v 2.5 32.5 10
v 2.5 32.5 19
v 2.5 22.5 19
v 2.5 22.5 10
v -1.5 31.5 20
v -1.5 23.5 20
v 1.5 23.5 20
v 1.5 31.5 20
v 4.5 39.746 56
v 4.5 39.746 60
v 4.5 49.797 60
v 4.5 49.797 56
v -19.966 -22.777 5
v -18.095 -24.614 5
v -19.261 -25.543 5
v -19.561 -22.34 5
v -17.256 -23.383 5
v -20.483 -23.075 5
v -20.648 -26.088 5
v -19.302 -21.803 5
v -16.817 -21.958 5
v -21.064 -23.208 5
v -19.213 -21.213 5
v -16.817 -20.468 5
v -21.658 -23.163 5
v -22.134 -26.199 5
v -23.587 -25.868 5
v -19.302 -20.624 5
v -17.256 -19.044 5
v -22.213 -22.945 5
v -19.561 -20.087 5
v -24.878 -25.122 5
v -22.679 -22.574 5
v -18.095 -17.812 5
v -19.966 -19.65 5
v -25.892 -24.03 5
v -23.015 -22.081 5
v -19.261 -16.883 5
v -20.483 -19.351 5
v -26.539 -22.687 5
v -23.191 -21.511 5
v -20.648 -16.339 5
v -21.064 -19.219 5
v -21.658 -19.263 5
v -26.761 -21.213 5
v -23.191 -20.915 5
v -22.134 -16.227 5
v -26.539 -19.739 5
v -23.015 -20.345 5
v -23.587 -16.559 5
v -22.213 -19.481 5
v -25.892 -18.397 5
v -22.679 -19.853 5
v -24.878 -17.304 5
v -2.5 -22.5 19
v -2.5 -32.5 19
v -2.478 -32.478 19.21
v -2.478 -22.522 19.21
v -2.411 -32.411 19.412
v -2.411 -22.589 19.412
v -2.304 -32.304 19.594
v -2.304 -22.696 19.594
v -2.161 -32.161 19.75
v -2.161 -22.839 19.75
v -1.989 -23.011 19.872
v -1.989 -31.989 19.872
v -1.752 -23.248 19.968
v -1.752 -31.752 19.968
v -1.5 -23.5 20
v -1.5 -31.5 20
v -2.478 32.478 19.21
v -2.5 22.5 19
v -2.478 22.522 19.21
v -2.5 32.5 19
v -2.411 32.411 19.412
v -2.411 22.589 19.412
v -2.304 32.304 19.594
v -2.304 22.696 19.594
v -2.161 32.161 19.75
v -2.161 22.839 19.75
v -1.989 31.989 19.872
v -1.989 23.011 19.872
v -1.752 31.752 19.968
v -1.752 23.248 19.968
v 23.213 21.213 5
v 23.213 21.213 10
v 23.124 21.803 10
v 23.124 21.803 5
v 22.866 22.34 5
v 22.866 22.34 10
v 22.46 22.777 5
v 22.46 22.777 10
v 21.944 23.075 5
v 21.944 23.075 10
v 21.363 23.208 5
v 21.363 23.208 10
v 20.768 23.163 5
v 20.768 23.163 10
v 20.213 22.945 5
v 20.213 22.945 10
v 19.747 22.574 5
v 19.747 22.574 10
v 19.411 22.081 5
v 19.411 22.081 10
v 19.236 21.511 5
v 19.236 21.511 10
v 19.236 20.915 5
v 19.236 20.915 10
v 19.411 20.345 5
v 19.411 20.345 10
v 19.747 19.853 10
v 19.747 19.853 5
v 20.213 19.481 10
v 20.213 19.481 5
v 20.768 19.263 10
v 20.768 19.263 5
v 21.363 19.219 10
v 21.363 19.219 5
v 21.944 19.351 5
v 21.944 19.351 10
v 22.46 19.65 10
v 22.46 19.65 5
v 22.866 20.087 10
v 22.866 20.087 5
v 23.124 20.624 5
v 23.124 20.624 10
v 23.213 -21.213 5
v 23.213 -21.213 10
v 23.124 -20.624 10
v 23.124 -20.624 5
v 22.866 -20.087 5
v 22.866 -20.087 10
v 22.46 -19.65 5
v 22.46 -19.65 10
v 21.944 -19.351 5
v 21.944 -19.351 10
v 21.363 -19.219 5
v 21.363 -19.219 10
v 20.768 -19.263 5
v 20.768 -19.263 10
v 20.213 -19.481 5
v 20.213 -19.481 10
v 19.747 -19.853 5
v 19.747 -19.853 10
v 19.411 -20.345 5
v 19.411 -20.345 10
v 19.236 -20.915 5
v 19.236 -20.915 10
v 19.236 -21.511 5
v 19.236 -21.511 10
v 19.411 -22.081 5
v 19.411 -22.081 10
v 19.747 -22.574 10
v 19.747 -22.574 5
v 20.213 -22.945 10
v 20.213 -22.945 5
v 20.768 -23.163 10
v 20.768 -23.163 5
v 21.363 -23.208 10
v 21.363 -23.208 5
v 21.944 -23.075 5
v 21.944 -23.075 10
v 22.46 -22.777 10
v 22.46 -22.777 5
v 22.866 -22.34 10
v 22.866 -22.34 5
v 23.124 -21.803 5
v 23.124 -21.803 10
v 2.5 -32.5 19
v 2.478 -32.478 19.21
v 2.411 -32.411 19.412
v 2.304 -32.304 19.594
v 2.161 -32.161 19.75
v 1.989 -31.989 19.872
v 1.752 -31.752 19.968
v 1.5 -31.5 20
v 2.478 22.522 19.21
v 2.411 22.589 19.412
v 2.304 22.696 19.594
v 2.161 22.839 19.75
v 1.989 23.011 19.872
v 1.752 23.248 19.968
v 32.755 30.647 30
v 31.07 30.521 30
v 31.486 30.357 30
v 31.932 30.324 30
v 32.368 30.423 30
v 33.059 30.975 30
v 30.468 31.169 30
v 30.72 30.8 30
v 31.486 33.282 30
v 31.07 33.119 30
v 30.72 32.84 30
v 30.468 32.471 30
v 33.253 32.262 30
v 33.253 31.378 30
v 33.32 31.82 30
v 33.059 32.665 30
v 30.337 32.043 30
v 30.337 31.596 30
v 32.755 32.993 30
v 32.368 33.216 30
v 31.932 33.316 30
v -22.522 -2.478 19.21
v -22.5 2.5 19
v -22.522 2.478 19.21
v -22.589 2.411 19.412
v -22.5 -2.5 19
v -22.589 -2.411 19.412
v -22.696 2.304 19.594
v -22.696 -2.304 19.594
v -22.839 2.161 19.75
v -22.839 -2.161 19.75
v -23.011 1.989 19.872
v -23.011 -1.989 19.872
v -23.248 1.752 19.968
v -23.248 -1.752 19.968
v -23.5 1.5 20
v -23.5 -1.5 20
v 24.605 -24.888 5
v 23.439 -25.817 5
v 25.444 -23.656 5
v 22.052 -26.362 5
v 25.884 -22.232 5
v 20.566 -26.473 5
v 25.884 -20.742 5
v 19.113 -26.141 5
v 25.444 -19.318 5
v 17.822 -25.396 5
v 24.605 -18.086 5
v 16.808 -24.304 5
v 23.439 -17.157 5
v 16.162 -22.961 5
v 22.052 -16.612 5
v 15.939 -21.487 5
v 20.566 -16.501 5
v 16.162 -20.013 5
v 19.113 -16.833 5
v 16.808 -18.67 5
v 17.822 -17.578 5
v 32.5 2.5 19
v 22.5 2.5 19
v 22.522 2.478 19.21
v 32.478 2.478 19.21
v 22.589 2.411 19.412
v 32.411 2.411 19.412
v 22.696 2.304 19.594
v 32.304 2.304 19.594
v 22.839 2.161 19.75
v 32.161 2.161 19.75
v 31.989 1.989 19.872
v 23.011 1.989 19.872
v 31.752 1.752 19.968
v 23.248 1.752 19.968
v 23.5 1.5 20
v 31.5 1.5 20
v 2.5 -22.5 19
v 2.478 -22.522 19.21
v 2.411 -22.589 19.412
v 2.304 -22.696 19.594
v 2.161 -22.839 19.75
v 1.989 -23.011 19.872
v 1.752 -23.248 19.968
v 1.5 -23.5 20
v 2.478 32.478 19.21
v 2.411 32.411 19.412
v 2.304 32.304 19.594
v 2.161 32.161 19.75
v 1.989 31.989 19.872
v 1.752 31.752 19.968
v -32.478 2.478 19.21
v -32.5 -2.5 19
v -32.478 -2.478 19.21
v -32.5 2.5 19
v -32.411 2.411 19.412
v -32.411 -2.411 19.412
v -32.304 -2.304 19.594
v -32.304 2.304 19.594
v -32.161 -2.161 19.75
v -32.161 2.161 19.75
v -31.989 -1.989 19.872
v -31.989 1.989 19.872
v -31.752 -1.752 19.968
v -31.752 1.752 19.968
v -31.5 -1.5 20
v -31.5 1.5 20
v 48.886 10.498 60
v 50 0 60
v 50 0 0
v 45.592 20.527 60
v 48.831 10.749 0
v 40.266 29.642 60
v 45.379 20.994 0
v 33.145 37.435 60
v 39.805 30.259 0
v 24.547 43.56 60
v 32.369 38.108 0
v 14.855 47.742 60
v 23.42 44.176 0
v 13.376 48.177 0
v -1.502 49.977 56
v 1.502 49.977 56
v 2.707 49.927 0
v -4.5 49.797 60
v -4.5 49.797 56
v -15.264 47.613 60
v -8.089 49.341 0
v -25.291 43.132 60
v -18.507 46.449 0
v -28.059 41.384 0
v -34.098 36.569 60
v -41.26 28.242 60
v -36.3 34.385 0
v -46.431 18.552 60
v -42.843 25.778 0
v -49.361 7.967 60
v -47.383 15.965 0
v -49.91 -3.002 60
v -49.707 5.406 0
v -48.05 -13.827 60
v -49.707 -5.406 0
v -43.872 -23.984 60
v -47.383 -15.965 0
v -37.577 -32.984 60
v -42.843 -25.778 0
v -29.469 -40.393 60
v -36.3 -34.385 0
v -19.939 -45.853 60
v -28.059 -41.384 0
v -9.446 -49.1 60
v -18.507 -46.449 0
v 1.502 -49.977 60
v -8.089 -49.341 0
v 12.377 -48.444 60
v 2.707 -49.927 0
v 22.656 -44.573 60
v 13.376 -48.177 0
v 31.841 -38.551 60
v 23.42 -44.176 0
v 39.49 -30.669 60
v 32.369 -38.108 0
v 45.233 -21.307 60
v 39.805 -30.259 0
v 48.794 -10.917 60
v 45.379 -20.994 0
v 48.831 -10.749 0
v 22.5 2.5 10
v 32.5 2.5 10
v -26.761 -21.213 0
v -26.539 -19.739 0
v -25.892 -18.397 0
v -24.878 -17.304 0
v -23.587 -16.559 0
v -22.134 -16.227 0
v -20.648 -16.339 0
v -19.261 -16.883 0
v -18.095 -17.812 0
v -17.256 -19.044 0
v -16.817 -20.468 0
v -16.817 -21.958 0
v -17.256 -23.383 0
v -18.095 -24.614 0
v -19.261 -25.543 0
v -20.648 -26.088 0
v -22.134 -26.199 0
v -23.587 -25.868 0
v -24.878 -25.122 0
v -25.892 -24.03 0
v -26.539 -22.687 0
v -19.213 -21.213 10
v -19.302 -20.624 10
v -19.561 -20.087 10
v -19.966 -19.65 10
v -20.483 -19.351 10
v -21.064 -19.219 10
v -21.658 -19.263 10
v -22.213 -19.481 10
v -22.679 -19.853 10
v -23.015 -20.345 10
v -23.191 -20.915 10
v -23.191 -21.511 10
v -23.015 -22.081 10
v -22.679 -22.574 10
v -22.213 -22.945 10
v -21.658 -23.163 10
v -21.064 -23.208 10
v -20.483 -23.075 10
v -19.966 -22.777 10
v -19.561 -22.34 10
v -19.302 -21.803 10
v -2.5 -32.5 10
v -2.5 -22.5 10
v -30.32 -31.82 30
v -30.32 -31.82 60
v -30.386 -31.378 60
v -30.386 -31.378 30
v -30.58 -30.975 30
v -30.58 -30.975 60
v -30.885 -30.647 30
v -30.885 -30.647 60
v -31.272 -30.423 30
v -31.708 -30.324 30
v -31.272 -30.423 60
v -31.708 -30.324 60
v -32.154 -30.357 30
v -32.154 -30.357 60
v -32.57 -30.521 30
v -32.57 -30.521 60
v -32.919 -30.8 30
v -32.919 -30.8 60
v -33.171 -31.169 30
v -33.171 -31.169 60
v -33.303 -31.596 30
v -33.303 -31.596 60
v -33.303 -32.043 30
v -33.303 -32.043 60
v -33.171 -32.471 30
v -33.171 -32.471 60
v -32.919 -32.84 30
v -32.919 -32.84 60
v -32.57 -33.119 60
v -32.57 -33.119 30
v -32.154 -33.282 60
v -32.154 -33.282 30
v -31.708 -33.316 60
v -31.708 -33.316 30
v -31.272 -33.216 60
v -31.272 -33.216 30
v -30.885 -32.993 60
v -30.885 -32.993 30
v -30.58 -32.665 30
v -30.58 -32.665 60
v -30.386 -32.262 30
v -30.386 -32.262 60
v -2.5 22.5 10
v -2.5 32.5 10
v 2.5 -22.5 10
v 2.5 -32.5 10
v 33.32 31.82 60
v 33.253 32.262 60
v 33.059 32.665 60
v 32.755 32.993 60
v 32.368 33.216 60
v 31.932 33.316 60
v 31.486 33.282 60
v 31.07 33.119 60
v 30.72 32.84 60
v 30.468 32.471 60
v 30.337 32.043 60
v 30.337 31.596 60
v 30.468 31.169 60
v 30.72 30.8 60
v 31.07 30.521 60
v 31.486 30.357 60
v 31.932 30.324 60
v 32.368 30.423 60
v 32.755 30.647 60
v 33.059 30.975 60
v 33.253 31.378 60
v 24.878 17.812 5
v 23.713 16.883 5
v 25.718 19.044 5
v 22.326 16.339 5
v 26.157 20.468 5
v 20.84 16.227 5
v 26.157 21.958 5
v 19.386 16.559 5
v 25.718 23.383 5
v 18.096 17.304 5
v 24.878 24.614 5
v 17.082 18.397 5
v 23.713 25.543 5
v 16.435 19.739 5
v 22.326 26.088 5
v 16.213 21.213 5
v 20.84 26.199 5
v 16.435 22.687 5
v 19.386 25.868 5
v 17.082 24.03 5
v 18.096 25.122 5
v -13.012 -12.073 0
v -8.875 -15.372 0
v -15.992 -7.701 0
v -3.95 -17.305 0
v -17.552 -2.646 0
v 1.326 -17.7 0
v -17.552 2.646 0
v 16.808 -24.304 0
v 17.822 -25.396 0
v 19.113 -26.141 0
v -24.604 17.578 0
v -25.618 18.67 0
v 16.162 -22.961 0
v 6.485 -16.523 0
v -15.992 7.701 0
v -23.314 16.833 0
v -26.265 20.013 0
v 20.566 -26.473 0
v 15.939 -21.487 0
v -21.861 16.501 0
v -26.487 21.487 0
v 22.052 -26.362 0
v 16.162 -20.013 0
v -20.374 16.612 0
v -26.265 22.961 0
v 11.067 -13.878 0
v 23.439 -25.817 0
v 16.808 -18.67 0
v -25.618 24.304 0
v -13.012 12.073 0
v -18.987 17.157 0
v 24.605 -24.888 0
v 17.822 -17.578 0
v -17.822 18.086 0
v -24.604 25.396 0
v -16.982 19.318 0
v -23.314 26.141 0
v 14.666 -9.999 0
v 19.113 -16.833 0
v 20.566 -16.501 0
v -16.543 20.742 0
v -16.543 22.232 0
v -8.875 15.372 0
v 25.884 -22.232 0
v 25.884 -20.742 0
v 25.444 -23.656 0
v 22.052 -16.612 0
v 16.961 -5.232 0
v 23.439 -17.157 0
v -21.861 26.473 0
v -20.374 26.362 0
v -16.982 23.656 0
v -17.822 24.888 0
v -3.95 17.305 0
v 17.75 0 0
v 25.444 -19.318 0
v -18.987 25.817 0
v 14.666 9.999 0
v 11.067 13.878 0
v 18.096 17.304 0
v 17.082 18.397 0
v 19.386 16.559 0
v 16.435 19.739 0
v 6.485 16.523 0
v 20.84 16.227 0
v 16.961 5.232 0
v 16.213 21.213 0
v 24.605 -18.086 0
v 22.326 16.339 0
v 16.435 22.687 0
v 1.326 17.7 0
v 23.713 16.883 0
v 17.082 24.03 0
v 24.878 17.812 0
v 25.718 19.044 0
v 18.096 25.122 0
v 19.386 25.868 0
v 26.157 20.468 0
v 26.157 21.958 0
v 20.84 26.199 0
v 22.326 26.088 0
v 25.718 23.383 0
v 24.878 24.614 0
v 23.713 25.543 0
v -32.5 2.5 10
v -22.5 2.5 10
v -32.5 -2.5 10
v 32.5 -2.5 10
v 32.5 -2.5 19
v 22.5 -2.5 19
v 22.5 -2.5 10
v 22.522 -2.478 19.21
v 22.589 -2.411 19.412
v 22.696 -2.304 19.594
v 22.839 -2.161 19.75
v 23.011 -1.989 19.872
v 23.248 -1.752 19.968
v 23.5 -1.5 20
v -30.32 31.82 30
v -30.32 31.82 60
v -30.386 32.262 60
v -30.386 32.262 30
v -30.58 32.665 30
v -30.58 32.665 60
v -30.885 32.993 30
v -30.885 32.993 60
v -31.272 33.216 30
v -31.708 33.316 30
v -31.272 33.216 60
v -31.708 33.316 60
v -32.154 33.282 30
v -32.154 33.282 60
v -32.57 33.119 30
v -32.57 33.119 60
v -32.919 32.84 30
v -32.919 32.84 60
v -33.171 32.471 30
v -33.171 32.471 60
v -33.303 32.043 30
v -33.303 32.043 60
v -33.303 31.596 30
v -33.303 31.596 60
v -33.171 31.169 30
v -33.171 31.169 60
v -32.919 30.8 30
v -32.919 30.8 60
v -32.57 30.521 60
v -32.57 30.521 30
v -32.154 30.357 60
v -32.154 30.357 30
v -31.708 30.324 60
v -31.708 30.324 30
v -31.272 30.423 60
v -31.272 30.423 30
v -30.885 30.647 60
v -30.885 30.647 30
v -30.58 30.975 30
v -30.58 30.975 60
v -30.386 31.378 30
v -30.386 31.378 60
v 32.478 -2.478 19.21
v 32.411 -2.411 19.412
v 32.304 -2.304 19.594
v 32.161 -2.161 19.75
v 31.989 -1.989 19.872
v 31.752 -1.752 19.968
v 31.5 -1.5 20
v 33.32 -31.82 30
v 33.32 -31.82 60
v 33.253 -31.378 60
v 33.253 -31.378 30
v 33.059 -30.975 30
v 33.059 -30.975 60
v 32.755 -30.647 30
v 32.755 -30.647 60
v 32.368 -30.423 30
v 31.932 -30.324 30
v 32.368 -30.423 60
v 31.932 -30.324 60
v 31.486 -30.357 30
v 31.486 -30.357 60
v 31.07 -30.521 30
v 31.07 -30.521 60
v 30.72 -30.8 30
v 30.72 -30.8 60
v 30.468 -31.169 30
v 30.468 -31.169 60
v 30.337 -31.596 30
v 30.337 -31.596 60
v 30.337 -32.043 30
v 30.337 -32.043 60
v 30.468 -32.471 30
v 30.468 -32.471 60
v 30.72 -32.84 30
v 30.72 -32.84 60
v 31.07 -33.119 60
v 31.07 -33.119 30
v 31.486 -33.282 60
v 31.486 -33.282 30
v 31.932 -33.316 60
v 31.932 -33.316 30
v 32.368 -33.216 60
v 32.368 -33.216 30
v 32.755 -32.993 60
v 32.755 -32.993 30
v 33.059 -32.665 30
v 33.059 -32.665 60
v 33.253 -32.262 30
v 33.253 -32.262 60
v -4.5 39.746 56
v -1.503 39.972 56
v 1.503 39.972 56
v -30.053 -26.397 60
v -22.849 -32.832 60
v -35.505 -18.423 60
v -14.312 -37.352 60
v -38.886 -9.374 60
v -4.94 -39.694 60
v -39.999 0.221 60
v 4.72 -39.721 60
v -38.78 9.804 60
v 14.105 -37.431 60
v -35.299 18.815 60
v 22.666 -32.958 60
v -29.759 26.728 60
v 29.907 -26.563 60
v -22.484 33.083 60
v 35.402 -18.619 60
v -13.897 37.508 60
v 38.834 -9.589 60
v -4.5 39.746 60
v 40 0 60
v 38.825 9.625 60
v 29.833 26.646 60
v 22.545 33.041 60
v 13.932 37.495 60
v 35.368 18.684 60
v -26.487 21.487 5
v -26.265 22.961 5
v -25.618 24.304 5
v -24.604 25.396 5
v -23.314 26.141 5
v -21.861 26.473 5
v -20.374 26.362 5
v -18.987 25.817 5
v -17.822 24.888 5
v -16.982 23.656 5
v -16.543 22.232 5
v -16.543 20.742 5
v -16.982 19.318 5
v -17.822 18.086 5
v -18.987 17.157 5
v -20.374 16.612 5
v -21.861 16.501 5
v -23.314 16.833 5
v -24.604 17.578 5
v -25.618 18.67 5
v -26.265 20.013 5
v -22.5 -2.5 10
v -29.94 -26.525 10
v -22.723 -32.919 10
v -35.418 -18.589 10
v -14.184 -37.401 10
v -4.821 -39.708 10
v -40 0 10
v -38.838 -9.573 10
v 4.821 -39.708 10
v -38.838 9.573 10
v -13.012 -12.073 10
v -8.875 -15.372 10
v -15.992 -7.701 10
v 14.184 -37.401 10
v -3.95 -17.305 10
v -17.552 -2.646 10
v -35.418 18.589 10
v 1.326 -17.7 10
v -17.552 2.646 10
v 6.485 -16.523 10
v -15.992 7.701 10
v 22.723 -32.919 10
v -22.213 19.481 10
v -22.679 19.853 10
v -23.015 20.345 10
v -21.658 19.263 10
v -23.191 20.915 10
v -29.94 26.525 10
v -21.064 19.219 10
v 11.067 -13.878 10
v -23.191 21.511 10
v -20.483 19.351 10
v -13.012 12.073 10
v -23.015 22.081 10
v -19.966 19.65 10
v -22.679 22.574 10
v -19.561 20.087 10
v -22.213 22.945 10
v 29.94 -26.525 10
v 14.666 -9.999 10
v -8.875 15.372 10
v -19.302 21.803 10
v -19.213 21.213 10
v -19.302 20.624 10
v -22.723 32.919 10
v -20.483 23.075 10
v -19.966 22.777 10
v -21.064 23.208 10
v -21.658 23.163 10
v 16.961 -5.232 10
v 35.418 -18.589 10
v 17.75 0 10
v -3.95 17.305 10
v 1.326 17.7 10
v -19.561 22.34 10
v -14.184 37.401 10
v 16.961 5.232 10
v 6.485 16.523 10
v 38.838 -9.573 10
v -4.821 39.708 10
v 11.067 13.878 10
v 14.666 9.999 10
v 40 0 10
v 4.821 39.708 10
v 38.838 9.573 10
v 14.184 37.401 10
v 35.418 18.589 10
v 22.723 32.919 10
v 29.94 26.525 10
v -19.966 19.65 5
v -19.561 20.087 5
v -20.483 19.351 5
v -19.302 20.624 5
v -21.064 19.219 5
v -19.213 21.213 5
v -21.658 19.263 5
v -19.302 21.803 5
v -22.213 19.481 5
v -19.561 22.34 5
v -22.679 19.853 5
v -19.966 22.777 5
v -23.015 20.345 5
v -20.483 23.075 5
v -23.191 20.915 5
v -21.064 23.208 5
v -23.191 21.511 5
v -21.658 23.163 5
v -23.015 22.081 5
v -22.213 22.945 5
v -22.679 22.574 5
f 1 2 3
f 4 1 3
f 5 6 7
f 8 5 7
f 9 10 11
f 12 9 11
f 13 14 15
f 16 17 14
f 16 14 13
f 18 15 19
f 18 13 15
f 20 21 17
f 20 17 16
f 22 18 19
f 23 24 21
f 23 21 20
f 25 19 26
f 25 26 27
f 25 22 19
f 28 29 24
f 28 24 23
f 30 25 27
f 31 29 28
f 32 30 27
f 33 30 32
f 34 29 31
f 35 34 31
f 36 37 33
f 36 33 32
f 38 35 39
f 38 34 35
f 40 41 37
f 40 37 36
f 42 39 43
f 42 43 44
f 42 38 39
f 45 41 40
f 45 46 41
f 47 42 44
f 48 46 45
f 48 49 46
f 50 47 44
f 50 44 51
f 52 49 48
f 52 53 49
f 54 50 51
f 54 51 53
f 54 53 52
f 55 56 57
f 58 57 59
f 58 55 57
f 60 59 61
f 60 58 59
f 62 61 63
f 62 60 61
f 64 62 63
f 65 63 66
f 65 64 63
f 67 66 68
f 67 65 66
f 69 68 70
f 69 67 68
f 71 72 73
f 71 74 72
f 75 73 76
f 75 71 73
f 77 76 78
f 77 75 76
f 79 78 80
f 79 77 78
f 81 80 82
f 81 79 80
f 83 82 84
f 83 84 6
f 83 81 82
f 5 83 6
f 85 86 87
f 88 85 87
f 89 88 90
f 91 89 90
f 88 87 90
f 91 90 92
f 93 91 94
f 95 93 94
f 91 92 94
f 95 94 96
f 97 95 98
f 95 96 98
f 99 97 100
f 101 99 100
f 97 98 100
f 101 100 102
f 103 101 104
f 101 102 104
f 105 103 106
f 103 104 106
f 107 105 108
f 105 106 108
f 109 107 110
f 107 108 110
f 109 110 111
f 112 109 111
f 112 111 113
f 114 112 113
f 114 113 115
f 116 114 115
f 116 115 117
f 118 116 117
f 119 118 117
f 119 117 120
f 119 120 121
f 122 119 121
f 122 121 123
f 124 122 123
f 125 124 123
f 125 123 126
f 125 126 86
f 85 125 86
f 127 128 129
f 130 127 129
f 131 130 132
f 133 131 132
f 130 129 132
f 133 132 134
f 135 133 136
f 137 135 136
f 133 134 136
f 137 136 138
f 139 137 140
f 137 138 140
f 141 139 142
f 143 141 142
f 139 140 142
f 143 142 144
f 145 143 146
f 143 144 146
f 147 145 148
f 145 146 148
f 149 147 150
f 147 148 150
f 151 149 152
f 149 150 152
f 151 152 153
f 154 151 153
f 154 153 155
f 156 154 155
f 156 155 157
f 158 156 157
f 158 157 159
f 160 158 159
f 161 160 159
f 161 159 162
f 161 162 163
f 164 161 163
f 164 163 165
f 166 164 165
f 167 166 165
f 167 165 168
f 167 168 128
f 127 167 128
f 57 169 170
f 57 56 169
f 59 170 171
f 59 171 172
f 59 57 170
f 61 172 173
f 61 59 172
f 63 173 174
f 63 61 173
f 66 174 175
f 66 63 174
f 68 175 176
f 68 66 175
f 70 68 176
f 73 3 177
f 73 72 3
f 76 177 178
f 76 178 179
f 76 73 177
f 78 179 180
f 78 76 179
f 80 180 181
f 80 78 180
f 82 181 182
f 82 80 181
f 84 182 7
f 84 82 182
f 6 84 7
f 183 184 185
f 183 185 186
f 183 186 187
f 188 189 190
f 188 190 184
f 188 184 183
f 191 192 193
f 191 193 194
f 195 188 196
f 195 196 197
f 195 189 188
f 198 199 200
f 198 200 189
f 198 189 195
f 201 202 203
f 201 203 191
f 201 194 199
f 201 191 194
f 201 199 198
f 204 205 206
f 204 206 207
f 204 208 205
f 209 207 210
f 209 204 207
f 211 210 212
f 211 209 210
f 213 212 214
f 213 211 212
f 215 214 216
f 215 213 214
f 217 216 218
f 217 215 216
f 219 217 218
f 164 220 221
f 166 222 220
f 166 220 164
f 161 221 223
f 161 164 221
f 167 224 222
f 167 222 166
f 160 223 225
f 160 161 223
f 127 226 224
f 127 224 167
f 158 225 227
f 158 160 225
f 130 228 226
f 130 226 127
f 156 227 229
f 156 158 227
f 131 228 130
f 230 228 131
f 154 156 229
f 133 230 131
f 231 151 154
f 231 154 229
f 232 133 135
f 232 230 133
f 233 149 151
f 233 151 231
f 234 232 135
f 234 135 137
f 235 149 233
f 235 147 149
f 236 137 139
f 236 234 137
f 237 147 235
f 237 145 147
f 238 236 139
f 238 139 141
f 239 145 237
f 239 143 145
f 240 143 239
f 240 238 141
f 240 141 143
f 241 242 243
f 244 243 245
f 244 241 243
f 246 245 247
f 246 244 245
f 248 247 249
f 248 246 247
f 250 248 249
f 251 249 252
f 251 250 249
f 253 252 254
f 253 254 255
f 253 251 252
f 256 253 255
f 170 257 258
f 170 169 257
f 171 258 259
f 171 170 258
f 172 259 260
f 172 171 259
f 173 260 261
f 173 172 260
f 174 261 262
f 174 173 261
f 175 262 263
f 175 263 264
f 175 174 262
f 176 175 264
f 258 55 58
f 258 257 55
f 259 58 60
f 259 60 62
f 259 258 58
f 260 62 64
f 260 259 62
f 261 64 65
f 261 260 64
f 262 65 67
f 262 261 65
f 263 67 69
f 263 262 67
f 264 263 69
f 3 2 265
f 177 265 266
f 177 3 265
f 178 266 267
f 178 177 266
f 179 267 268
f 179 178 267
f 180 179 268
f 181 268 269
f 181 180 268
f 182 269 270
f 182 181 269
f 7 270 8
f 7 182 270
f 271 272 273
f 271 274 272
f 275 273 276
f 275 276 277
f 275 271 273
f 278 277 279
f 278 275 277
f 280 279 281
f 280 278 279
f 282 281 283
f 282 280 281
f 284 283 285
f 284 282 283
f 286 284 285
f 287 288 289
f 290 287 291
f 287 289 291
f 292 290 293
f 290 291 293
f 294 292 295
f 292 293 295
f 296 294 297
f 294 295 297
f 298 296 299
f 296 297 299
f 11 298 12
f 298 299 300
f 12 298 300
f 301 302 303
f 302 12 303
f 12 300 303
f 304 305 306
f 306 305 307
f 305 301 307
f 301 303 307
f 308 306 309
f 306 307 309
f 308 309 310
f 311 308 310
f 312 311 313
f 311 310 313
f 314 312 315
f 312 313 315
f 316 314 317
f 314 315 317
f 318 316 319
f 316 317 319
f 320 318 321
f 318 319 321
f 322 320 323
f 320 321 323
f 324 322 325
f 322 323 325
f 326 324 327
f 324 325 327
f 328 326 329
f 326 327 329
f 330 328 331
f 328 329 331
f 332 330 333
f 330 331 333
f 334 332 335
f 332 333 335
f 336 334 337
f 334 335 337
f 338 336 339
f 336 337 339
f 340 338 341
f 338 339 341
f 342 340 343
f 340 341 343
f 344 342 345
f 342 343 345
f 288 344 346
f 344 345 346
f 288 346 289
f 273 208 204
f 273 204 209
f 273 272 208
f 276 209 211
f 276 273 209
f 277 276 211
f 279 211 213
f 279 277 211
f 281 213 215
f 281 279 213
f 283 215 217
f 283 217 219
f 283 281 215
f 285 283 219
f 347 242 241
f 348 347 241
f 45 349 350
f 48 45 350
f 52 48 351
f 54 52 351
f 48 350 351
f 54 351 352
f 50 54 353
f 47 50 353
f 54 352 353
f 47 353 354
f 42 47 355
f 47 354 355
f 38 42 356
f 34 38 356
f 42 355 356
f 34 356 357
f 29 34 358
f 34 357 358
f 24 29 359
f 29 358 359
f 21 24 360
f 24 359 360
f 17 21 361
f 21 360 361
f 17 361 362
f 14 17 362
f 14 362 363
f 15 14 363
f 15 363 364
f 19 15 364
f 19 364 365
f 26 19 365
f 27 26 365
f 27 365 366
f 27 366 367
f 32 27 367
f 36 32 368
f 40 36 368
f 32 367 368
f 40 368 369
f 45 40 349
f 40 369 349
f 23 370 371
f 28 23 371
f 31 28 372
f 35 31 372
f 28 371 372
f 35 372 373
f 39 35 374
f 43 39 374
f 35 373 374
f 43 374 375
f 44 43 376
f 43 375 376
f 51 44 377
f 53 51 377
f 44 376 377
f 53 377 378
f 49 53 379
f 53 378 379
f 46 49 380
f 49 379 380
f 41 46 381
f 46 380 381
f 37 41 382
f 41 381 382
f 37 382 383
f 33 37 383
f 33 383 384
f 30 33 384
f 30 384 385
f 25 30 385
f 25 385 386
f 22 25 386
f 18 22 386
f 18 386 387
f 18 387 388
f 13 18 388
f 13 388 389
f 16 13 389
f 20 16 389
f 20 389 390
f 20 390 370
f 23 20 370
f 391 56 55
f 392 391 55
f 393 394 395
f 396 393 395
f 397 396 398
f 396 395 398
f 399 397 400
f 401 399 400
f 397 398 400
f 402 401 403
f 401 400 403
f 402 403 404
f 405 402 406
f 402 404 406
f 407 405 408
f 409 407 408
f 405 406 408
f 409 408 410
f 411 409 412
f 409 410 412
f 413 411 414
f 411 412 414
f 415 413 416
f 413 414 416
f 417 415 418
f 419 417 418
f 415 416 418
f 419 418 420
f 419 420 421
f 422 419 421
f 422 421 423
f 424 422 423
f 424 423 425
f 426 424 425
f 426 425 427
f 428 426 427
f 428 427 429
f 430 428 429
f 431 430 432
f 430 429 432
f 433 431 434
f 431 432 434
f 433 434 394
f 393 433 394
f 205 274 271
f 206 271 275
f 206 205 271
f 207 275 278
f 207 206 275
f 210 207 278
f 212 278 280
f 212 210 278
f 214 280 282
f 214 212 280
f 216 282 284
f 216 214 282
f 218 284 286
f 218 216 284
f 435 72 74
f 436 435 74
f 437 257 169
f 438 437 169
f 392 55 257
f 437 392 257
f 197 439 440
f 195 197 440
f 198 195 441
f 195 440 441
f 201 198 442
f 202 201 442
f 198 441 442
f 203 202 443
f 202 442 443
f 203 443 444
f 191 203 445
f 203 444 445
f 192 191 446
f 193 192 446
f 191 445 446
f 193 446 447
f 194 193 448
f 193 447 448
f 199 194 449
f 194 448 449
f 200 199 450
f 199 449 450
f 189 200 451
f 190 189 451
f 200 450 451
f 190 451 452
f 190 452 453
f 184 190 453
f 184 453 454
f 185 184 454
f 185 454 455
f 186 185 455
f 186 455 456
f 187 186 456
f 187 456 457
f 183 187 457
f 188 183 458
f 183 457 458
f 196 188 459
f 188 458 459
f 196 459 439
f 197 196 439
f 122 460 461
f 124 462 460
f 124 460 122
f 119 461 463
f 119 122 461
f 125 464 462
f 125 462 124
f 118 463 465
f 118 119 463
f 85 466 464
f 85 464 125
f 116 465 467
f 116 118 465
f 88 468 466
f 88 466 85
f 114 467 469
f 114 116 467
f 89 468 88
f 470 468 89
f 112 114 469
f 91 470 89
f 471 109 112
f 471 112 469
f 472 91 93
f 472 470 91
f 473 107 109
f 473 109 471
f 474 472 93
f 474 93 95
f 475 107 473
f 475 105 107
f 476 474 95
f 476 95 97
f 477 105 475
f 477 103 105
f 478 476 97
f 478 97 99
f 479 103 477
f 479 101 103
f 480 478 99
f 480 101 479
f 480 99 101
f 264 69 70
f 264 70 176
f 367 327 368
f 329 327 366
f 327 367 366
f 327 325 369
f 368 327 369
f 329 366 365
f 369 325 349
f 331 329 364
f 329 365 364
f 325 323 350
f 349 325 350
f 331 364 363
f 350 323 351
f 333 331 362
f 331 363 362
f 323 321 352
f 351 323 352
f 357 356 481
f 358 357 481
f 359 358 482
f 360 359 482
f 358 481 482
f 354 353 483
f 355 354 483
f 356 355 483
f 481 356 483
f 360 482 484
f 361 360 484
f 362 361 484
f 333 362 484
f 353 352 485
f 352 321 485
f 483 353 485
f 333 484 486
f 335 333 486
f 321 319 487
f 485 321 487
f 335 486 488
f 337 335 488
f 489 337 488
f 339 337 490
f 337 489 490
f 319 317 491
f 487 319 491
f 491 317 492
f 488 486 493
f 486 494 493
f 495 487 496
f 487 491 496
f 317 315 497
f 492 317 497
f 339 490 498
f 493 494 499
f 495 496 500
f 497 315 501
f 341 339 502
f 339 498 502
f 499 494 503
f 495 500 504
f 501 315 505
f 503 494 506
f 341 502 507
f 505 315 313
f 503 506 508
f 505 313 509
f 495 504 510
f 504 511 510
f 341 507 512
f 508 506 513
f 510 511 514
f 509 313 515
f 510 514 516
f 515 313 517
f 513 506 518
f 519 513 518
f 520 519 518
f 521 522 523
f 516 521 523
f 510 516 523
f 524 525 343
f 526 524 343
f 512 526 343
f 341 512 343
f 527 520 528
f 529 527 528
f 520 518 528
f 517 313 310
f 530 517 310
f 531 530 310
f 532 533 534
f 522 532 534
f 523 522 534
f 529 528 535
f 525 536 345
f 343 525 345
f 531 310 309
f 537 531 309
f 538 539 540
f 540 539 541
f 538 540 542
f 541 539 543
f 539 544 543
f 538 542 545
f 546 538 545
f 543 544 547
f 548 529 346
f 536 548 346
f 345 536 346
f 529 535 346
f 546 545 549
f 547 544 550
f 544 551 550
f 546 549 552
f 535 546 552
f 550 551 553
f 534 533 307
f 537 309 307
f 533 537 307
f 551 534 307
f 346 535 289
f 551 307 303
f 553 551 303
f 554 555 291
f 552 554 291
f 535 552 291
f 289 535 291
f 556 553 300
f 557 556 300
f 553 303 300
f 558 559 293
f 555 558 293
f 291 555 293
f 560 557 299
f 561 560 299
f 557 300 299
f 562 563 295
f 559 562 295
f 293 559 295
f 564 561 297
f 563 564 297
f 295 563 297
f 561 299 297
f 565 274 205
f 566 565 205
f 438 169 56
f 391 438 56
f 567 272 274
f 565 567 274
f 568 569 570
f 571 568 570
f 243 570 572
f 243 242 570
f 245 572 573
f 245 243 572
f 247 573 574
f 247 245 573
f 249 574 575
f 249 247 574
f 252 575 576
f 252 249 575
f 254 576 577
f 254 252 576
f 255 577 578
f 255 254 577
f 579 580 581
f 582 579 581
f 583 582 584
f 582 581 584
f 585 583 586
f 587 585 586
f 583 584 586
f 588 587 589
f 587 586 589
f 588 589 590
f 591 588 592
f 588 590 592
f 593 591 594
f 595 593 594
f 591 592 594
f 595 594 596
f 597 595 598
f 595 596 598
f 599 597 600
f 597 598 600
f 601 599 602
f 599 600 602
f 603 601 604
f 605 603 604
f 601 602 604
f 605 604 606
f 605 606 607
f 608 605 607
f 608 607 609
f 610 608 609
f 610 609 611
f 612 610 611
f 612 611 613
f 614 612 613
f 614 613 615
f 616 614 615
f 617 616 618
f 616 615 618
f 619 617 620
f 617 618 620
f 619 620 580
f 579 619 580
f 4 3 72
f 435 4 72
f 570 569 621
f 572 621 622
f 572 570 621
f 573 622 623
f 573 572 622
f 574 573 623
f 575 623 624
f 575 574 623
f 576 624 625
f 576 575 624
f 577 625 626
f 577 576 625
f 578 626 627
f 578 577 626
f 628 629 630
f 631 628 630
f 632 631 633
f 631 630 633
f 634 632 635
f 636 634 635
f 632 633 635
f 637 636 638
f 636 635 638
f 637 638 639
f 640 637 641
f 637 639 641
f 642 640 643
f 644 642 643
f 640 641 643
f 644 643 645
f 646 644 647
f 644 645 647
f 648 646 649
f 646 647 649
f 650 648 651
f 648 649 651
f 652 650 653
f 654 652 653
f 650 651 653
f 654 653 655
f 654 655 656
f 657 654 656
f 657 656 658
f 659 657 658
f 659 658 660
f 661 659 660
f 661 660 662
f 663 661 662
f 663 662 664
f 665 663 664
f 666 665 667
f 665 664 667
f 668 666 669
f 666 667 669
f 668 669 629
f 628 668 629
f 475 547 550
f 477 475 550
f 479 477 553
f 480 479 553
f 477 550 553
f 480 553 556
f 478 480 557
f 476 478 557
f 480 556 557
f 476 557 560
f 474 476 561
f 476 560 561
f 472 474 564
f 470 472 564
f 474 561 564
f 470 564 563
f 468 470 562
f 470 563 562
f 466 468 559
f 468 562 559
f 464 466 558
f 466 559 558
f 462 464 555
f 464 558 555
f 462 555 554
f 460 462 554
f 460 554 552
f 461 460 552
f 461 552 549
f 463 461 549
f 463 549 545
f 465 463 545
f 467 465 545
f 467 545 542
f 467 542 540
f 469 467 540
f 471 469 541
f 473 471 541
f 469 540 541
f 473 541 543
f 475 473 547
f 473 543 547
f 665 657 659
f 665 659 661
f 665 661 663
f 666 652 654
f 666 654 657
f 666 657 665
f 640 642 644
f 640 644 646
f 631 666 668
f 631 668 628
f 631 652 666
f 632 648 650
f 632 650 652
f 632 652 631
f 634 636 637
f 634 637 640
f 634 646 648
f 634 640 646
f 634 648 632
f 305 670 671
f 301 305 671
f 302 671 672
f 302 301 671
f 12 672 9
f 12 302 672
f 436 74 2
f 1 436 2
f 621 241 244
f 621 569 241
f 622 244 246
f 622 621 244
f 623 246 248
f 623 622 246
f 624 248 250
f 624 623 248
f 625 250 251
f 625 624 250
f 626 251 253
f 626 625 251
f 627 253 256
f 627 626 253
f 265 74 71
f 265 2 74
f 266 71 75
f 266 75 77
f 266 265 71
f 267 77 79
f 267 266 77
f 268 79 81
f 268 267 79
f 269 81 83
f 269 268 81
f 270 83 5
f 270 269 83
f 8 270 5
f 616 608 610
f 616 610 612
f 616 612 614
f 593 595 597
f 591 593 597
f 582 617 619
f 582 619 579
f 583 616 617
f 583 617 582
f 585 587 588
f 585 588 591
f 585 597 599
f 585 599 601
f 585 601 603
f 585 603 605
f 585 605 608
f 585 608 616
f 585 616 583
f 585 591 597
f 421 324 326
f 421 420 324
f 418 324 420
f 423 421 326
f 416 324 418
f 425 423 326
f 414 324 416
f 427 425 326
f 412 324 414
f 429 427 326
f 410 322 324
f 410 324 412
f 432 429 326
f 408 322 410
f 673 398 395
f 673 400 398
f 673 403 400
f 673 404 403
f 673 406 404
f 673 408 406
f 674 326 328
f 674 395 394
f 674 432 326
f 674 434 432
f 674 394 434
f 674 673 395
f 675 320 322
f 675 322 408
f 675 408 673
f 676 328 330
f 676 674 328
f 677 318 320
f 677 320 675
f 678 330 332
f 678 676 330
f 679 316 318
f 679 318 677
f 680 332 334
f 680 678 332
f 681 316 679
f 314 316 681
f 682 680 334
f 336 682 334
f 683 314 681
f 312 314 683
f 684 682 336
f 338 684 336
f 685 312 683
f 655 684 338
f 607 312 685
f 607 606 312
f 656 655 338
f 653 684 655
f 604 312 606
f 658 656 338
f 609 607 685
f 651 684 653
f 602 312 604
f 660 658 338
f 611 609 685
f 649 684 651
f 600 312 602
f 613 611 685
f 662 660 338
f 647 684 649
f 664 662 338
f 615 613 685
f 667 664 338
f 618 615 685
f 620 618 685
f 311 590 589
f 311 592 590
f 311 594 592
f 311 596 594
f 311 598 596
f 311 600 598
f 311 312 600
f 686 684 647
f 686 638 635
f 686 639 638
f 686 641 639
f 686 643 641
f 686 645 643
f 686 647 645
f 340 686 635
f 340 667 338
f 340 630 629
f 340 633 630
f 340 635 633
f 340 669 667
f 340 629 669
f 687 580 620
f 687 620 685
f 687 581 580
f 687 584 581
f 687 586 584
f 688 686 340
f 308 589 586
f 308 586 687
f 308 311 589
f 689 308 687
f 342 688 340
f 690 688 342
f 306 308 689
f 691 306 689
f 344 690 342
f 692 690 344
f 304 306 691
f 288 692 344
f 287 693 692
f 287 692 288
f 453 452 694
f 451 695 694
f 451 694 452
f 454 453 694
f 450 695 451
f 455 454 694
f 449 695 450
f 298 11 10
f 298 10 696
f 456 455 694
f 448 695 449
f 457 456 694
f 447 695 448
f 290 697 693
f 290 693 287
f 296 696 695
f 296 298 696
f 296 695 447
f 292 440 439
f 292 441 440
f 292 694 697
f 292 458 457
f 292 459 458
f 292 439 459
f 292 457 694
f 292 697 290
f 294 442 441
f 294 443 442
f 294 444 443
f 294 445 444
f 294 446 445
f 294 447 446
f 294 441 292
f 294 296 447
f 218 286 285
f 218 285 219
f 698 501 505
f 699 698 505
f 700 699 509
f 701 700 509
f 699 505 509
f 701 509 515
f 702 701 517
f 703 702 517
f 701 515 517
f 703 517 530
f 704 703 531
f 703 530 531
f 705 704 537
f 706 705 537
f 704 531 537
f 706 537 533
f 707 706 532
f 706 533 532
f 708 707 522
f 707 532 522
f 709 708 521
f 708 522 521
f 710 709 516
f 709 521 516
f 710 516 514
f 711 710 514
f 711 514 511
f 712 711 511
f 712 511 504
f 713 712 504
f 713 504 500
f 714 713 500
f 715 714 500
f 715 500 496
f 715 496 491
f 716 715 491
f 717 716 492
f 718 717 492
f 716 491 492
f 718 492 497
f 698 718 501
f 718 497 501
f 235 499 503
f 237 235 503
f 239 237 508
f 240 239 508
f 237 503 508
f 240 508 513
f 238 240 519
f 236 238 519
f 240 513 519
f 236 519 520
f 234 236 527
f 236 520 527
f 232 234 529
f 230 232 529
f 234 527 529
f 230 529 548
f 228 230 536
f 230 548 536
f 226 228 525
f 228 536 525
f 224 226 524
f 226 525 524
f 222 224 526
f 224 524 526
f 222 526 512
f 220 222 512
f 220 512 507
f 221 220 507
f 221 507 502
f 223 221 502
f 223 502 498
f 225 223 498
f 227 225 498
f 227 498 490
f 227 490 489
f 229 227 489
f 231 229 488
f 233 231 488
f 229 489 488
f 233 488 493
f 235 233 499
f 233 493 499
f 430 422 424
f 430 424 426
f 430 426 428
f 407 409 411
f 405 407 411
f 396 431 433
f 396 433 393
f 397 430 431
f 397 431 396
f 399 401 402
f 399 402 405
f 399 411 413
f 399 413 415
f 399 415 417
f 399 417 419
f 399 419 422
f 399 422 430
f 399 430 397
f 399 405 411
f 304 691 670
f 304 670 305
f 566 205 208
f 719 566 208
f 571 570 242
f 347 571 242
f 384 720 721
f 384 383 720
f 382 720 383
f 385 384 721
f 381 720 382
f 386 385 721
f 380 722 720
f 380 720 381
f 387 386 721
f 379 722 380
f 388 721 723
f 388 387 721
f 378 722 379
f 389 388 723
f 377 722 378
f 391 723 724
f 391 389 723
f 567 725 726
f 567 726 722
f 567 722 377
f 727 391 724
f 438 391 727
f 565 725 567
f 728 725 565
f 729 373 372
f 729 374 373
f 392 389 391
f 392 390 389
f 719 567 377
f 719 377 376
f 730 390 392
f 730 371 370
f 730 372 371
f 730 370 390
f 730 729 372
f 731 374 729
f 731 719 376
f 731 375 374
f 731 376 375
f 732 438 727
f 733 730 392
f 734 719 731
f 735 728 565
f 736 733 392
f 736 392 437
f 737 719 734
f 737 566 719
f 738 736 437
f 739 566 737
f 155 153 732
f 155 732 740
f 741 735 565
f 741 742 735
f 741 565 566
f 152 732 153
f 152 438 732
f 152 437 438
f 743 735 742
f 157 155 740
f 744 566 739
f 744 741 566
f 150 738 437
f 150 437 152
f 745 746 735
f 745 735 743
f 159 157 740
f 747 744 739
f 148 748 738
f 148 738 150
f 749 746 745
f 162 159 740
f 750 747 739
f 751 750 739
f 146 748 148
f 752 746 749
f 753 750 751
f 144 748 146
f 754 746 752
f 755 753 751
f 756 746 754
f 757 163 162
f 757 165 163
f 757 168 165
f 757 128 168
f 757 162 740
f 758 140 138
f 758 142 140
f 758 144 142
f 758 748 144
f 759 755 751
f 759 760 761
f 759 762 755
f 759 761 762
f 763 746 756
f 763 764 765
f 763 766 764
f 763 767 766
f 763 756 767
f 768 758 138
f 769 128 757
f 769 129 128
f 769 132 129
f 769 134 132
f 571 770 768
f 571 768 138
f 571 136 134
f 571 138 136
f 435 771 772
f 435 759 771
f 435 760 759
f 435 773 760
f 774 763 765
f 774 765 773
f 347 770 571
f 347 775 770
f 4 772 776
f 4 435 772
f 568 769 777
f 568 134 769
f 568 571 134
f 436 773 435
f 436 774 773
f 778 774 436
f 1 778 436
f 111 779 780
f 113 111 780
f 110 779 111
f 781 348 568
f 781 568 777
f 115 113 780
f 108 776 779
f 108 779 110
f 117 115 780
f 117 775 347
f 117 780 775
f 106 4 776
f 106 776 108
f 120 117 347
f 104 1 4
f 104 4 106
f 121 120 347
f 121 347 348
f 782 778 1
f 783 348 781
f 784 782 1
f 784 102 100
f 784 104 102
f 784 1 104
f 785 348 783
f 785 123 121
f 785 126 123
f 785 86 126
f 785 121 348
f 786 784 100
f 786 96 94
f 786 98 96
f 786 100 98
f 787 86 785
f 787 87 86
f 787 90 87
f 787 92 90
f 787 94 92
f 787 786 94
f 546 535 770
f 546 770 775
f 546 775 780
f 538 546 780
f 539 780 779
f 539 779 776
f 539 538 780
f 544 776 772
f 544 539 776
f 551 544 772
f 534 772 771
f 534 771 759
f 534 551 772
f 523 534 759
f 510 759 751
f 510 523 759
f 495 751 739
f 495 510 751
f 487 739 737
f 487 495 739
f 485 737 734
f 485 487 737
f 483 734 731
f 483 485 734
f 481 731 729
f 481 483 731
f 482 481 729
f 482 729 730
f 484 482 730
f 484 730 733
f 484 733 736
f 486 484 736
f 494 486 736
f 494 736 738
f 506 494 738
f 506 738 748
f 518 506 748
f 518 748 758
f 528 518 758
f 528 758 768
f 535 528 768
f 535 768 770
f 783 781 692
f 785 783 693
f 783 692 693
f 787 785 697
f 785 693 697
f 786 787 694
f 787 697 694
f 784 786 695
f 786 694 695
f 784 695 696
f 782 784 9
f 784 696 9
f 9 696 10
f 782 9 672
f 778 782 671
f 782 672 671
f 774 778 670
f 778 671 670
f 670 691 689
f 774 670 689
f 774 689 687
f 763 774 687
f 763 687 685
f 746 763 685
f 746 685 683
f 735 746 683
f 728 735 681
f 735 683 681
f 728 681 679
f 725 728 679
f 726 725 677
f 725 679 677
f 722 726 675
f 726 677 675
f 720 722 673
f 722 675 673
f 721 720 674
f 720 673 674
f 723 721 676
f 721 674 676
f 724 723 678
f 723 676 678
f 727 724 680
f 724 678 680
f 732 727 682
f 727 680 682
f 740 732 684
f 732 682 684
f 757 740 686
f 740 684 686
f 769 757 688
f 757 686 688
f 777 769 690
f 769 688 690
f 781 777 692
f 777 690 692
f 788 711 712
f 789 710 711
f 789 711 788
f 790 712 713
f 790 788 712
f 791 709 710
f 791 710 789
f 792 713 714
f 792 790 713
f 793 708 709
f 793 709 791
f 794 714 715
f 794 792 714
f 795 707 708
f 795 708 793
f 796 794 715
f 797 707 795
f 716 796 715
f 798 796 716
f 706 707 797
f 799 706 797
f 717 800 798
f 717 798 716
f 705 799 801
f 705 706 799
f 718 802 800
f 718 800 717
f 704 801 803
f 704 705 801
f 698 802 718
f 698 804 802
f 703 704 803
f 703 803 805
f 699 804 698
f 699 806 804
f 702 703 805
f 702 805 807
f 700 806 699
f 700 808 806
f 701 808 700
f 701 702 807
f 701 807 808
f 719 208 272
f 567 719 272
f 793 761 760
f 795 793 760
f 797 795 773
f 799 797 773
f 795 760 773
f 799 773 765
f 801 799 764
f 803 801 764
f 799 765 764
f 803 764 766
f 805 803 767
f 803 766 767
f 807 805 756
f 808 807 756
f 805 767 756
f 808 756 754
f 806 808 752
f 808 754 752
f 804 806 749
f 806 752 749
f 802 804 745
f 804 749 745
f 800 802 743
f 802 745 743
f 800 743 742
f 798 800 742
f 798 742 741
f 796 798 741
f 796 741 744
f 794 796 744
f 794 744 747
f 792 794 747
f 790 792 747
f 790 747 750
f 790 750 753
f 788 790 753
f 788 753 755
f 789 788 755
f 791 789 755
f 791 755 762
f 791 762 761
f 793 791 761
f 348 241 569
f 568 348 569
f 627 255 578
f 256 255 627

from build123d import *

# Parameters (mm, degrees)
CROQUIS1_R              = 50
CROQUIS1_R_2            = 17.75
SALIENTE_EXTRUIR1_DEPTH = 70
CROQUIS2_R              = 40
CORTAR_EXTRUIR1_DEPTH   = 50
CROQUIS4_R              = 40
CROQUIS4_R_2            = 17.75
CORTAR_EXTRUIR3_DEPTH   = 10
CROQUIS5_R              = 2
CORTAR_EXTRUIR4_DEPTH   = 11
CROQUIS6_R              = 5
CORTAR_EXTRUIR5_DEPTH   = 5
REDONDEO2_R             = 1
CORTAR_EXTRUIR7_START   = -10
CROQUIS8_W              = 9
CROQUIS8_H              = 20
CORTAR_EXTRUIR7_DEPTH   = 4
CROQUIS9_R              = 52.339140615
CORTAR_EXTRUIR8_DEPTH   = 10
CROQUIS10_R             = 1.5
CORTAR_EXTRUIR9_DEPTH   = 30


with BuildPart() as part:
    # Croquis1 → Saliente-Extruir1 (new body)
    with BuildSketch(Plane.XY):
        Circle(CROQUIS1_R)
        Circle(CROQUIS1_R_2, mode=Mode.SUBTRACT)
    extrude(amount=SALIENTE_EXTRUIR1_DEPTH)

    # Croquis2 → Cortar-Extruir1 (cut)
    with BuildSketch(Plane.XY.offset(70)):
        Circle(CROQUIS2_R)
    extrude(amount=-CORTAR_EXTRUIR1_DEPTH, mode=Mode.SUBTRACT)

    # Croquis4 → Cortar-Extruir3 (cut)
    with BuildSketch(Plane.XY.offset(20)):
        Circle(CROQUIS4_R)
        with BuildLine():
            Line((-2.5, 27.386127875), (-2.5, 32.5))
            Line((-2.5, 32.5), (2.5, 32.5))
            Line((2.5, 32.5), (2.5, 27.386127875))
            ThreePointArc((2.5, 27.386127875), (19.445436483, 19.445436483), (27.386127875, 2.5))
            Line((27.386127875, 2.5), (32.5, 2.5))
            Line((32.5, 2.5), (32.5, -2.5))
            Line((32.5, -2.5), (27.386127875, -2.5))
            ThreePointArc((27.386127875, -2.5), (19.445436483, -19.445436483), (2.5, -27.386127875))
            Line((2.5, -27.386127875), (2.5, -32.5))
            Line((2.5, -32.5), (-2.5, -32.5))
            Line((-2.5, -32.5), (-2.5, -27.386127875))
            ThreePointArc((-2.5, -27.386127875), (-19.445436483, -19.445436483), (-27.386127875, -2.5))
            Line((-27.386127875, -2.5), (-32.5, -2.5))
            Line((-32.5, -2.5), (-32.5, 2.5))
            Line((-32.5, 2.5), (-27.386127875, 2.5))
            ThreePointArc((-27.386127875, 2.5), (-19.445436483, 19.445436483), (-2.5, 27.386127875))
        make_face(mode=Mode.SUBTRACT)
        with BuildLine():
            Line((-2.5, 22.5), (-2.5, 27.386127875))
            ThreePointArc((-2.5, 27.386127875), (-19.445436483, 19.445436483), (-27.386127875, 2.5))
            Line((-27.386127875, 2.5), (-22.5, 2.5))
            Line((-22.5, 2.5), (-22.5, -2.5))
            Line((-22.5, -2.5), (-27.386127875, -2.5))
            ThreePointArc((-27.386127875, -2.5), (-19.445436483, -19.445436483), (-2.5, -27.386127875))
            Line((-2.5, -27.386127875), (-2.5, -22.5))
            Line((-2.5, -22.5), (2.5, -22.5))
            Line((2.5, -22.5), (2.5, -27.386127875))
            ThreePointArc((2.5, -27.386127875), (19.445436483, -19.445436483), (27.386127875, -2.5))
            Line((27.386127875, -2.5), (22.5, -2.5))
            Line((22.5, -2.5), (22.5, 2.5))
            Line((22.5, 2.5), (27.386127875, 2.5))
            ThreePointArc((27.386127875, 2.5), (19.445436483, 19.445436483), (2.5, 27.386127875))
            Line((2.5, 27.386127875), (2.5, 22.5))
            Line((2.5, 22.5), (-2.5, 22.5))
        make_face()
        Circle(CROQUIS4_R_2, mode=Mode.SUBTRACT)
    extrude(amount=-CORTAR_EXTRUIR3_DEPTH, mode=Mode.SUBTRACT)

    # Croquis5 → Cortar-Extruir4 (cut, through all)
    with BuildSketch(Plane.XY.offset(10)):
        with Locations((21.213203436, 21.213203436)):
            Circle(CROQUIS5_R)
        with Locations((21.213203436, -21.213203436)):
            Circle(CROQUIS5_R)
        with Locations((-21.213203436, -21.213203436)):
            Circle(CROQUIS5_R)
        with Locations((-21.213203436, 21.213203436)):
            Circle(CROQUIS5_R)
    extrude(amount=-CORTAR_EXTRUIR4_DEPTH, mode=Mode.SUBTRACT)

    # Croquis6 → Cortar-Extruir5 (cut)
    with BuildSketch(Plane(origin=(0, 0, 0), x_dir=(-1, 0, 0), z_dir=(0, 0, -1))):
        with Locations((-21.213203436, 21.213203436)):
            Circle(CROQUIS6_R)
        with Locations((21.486974797, 21.486974797)):
            Circle(CROQUIS6_R)
        with Locations((21.760746158, -21.213203436)):
            Circle(CROQUIS6_R)
        with Locations((-20.939432074, -21.486974797)):
            Circle(CROQUIS6_R)
    extrude(amount=-CORTAR_EXTRUIR5_DEPTH, mode=Mode.SUBTRACT)

    # Redondeo2
    redondeo2_edges = [part.edges().sort_by_distance(p)[0] for p in [
        (-40, 0, 70),
        (-22.5, 0, 20),
        (2.5, -27.5, 20),
        (32.5, 0, 20),
        (27.5, 2.5, 20),
        (-2.5, 27.5, 20),
        (-27.5, -2.5, 20),
        (0, -22.5, 20),
        (0, 22.5, 20),
        (2.5, 27.5, 20),
        (0, 32.5, 20),
        (27.5, -2.5, 20),
        (22.5, 0, 20),
        (-2.5, -27.5, 20),
        (0, -32.5, 20),
        (-32.5, 0, 20),
        (-27.5, 2.5, 20),
        (-50, 0, 70),
    ]]
    fillet(redondeo2_edges, radius=REDONDEO2_R)

    # Croquis8 → Cortar-Extruir7 (cut)
    with BuildSketch(Plane.XY.offset(70).offset(CORTAR_EXTRUIR7_START)):
        with Locations((0, 45)):
            Rectangle(CROQUIS8_W, CROQUIS8_H)
    extrude(amount=-CORTAR_EXTRUIR7_DEPTH, mode=Mode.SUBTRACT)

    # Croquis9 → Cortar-Extruir8 (cut)
    with BuildSketch(Plane.XY.offset(70)):
        Circle(CROQUIS9_R)
    extrude(amount=-CORTAR_EXTRUIR8_DEPTH, mode=Mode.SUBTRACT)

    # Croquis10 → Cortar-Extruir9 (cut)
    with BuildSketch(Plane.XY.offset(60)):
        with Locations((31.819805153, 31.819805153)):
            Circle(CROQUIS10_R)
        with Locations((31.819805153, -31.819805153)):
            Circle(CROQUIS10_R)
        with Locations((-31.819805153, -31.819805153)):
            Circle(CROQUIS10_R)
        with Locations((-31.819805153, 31.819805153)):
            Circle(CROQUIS10_R)
    extrude(amount=-CORTAR_EXTRUIR9_DEPTH, mode=Mode.SUBTRACT)


solid = part.part
